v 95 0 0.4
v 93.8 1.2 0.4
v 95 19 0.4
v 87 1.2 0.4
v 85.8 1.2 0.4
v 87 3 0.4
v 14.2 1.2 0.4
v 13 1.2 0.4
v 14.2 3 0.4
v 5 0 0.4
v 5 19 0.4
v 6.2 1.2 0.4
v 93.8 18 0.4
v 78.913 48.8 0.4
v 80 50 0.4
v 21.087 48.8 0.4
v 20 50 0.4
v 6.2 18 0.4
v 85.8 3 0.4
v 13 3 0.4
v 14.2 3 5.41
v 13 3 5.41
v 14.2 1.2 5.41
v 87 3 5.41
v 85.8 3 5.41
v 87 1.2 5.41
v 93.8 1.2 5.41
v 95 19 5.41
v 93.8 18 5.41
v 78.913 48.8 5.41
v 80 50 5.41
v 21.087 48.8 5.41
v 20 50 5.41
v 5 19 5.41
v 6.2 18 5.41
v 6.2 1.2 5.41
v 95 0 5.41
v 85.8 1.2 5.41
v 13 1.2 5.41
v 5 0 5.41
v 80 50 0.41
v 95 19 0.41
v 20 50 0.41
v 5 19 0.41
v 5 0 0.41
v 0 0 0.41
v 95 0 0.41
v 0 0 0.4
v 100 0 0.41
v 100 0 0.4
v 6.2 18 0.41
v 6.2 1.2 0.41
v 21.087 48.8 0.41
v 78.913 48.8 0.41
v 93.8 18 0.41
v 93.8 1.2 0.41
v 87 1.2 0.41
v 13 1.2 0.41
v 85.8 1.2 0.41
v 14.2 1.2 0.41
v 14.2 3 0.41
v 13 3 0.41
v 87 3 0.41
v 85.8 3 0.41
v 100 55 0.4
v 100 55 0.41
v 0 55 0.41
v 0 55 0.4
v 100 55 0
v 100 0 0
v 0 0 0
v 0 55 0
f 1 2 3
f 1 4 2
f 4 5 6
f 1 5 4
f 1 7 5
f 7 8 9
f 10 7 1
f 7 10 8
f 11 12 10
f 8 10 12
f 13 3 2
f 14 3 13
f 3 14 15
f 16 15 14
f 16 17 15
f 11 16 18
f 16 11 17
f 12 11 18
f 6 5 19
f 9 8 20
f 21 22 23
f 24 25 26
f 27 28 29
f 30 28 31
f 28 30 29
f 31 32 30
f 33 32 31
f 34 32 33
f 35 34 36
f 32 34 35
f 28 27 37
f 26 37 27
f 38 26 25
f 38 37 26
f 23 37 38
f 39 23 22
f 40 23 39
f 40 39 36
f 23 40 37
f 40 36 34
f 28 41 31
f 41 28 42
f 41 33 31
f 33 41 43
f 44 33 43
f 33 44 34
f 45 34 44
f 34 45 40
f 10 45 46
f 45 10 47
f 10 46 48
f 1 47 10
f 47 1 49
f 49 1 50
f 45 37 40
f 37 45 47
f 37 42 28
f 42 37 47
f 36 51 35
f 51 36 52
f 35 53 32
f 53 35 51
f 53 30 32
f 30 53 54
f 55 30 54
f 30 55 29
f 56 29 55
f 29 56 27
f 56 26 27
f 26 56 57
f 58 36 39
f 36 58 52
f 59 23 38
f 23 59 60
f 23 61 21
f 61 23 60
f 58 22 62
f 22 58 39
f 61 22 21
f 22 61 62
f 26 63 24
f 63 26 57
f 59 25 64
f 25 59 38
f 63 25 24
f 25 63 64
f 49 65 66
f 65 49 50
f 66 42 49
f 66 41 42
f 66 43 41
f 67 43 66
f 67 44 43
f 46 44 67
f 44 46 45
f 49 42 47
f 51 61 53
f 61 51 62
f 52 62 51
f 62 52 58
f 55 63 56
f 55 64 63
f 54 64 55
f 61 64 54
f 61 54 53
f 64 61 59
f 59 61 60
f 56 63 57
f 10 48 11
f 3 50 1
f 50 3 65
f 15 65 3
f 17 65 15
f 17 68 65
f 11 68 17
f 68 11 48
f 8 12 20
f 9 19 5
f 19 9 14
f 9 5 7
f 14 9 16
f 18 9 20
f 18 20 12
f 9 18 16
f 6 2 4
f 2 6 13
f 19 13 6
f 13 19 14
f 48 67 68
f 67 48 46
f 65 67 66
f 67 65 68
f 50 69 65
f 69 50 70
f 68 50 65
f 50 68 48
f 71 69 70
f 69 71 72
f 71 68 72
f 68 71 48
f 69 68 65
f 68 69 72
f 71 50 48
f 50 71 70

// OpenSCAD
// file: ../../Base/Boxes.scad
// Fischertechnik Box Foundation
// Pre-designed Boxes

use <Constants.scad>

include <PlacementOptions.scad>

box190Width = 190;
box190Depth = 130;
box130Width = 130;
box130Depth = 95;
boxUsageHeight = 33.9;
boxWallThickness = 2.4;
boxBaseThickness = 1.0;
boxWebWidth = 3.0;

// getBoxWallThickness()
// Gets the wall thickness of a Fischertechnik Box

function getBoxWallThickness() = boxWallThickness;

// Gets the usable height of a fischertechnik box
function getBoxUsageHeight() = boxUsageHeight;

// Gets the thickness of the Fischertechnik box base.
function getBoxBaseThickness() = boxBaseThickness;

// Gets the width of a box web
function getBoxWebWidth() = boxWebWidth;

// Gets the usable inner space of a Box 190 as an x/y-list
function getBox190Space() = [
    box190Width - 2*getBoxWallThickness(), 
    box190Depth - 2*getBoxWallThickness() ];

// Imports the Fischertechnik empty box 130x190 mm and places it at position 0,0
// 190x130 are the outer sizes, the inner space is slightly smaller. Use getBox190Space() to get the inner sizes.
// This module needs the STL file "Fischertechnik Box 130x190.stl" in the library path.
// The box is positioned that the usable inner space is at the 0,0,0 position. The

module Box190() {
    translate([-getBoxWallThickness(),-getBoxWallThickness(),-getBoxBaseThickness()])
        import("Fischertechnik Box 130x190.stl", convexity=3);
}

// Gets the usable inner space of a Box 130 as an x/y-list
function getBox130Space() = [
    box130Width - 2*getBoxWallThickness(), 
    box130Depth - 2*getBoxWallThickness() ];

// Imports the Fischertechnik empty box 95x130 mm and places it at position 0,0
// 190x130 are the outer sizes, the inner space is slightly smaller. Use getBox190Space() to get the inner sizes.
// This module needs the STL file "Fischertechnik Box 95x130.stl" in the library path.
// The box is positioned that the usable inner space is at the 0,0,0 position. The

module Box130() {
    translate([-getBoxWallThickness(),-getBoxWallThickness(),-getBoxBaseThickness()])
        import("Fischertechnik Box 95x130.stl", convexity=3);
}

// Creates a web at the specified box walls
// corner 0 = LowerLeft, 1 = UpperLeft, 2 = UpperRight, 3 = LowerRight
// side 0 = LeftOfCorner, 1 = RightOfCorner
// distance = Distance in mm from the corner
// box = inner width and depth of the box (default: Box 190)
// webWidth = length of the web (default is 3 mms)
// webThickness = thickness of the web (default is 1 mm)

module BoxWeb(corner, side, distance, box=getBox190Space(), webWidth=getBoxWebWidth(), webThickness=1.0) {
    sink = getBoxWallThickness()/2;

    width = (corner % 2 == 0) ? 
            (side == LeftOfCorner ? webWidth : webThickness) :
            (side == LeftOfCorner ? webThickness : webWidth);

    depth = (corner % 2 == 0) ? 
            (side == RightOfCorner ? webWidth : webThickness) :
            (side == RightOfCorner ? webThickness : webWidth);
    
    xDiff = corner == LowerLeft ? 
                (side == LeftOfCorner ? -sink : distance) :
            (corner == UpperLeft ?                
                (side == LeftOfCorner ? distance : -sink) :
            (corner == UpperRight ?
                (side == LeftOfCorner ? box.x-webWidth+sink : box.x-distance-webThickness) :
                (side == LeftOfCorner ? box.x-distance-webThickness: box.x-webWidth+sink)));

    yDiff = corner == LowerLeft ? 
                (side == RightOfCorner ? -sink : distance) :
            (corner == UpperLeft ?
                (side == RightOfCorner ? box.y-distance : box.y-webWidth+sink) :
            (corner == UpperRight ?
                (side == RightOfCorner ? box.y-webWidth+sink : box.y-distance) :
                (side == RightOfCorner ? distance : -sink)));
    
    translate([xDiff, yDiff, -getExcess()])
        cube([width, depth, boxUsageHeight + 2*getExcess()]);
}
// file: ../../Base/Rotation.scad
// Fischertechnik Box Foundation
// Geometry Helpers Rotation

include <PlacementOptions.scad>

// getRotatedSpace(space, rotation=NoRotation)
// Rotates the space dependent on the specified rotation

function getRotatedSpace(space, rotation=NoRotation) = [
    (rotation == Rotate90 || rotation == Rotate270) ? space.y : space.x,
    (rotation == Rotate90 || rotation == Rotate270) ? space.x : space.y
];

// Rotates the given space around the fixed left lower corner
// space = the space the children needs as width/depth list [width,depth]
// rotation = 0 Rotate0 degrees, 1 Rotate90 degrees, 2 Rotate180 degrees, 3 Rotate270 degrees (equivalent to -90)

module RotateFix(space, rotation=Rotate0) {
    dy = (rotation == Rotate0 || rotation == Rotate270) ? 0 :
        (rotation == Rotate90) ? space.x :
        space.y;
    dx = (rotation < Rotate180) ? 0 :
        (rotation == Rotate180) ? space.x :
        space.y;
    
    translate([dx, dy, 0])
        rotate([0, 0, rotations[rotation]])
            children();
}
// file: ../../Base/Alignment.scad
// Fischertechnik Box Foundation
// Geometry Helpers Alignment

include <PlacementOptions.scad>

// getAlignedX(elementWidth, spaceWidth, align=AlignRight, offset=0)
// Gets the aligned X offset of an element with the given
// width in the given space.
// elementWidth = The width of the element to positon
// spaceWidth = The space where the element should be aligned
// align = 0 AlignLeft, 1 AlignCenter, 2 AlignRight
// offset = an optional offset from the aligned position. When
// aligned left or centered, then positive values are in X direction.
// When aligned right then positive values are in negative X direction.

function getAlignedX(elementWidth, spaceWidth, align=AlignRight, offset=0) =
    (align == AlignLeft) ?
        offset :
        ((align == AlignCenter) ?
        (spaceWidth - elementWidth)/2 + offset :
        spaceWidth - offset - elementWidth);

// getAlignedY(elementDepth, spaceDepth, align=AlignTop, offset=0)
// Gets the aligned Y offset of an element with the given
// depth in the given space.
// elementDepth = The depth of the element to positon
// spaceDepth = The space where the element should be aligned
// align = 0 AlignBottom, 1 AlignCenter, 2 AlignTop
// offset = an optional offset from the aligned position. When
// aligned bottom or centered, then positive values are in Y direction.
// When aligned top then positive values are in negative Y direction.

function getAlignedY(elementDepth, spaceDepth, align=AlignTop, offset=0) =
    (align == AlignBottom) ?
        offset :
        ((align == AlignCenter) ?
        (spaceDepth - elementDepth)/2 + offset :
        spaceDepth - offset - elementDepth);
// file: ../../Base/PlacementOptions.scad
// Fischertechnik Box Foundation
// Placement Options

// Alignment
NoAlign = 0;
AlignLeft = 1;
AlignBottom = 2;
AlignCenter = 3;
AlignRight = 4;
AlignTop = 5;

// Element rotation degree steps
rotations = [0, -90, -180, -270];

// Rotation
NoRotation = 0;
Rotate0 = 0;
Rotate90 = 1;
Rotate180 = 2;
Rotate270 = 3;

// Docking (seen from above)
NoDock = -1;
DockLeft = 0;
DockTop = 1;
DockRight = 2;
DockCorner = 2;
DockBottom = 3;

// Web corners
LowerLeft = 0;
UpperLeft = 1;
UpperRight = 2;
LowerRight = 3;

// Web position relative to corner
LeftOfCorner = 0;
RightOfCorner = 1;
// file: ../../Base/Placement.scad
// Fischertechnik Box Foundation
// Geometry Helpers Placement

use <Constants.scad>
use <Alignment.scad>
use <Rotation.scad>
use <Boxes.scad>

include <PlacementOptions.scad>

// Place(x=0, y=0, elementSpace=[0,0], alignX=AlignLeft, alignY=AlignBottom, rotation=Rotate0, boxSpace=getBox190Space())
// Places the child at the specified position
// y = Y-Position. This is a relative position when an X aligment is specified.
// x = X-Position. This is a relative position when an Y aligment is specified.
// elementSpace = space of the element to be placed [x,y]
// alignX = -1=NoAlign, 0 AlignLeft, 1 AlignCenter, 3 AlignRight (elementSpace and boxSpace required!)
// alignY = -1=NoAlign, 2 AlignBottom, 1 AlignCenter, 4 AlignTop (elementSpace and boxSpace required!)
// rotation = 0 Rotate0 0 degrees, 1 Rotate90 90 degrees, 
// 2 Rotate180 180 degrees, 3 Rotate270 270 degrees (equivalent to -90)
// boxSpace = Inner space of the box where the placement occurs [x,y] - default is Box 190x130 inner space

module Place(x=0, y=0, elementSpace=[0,0], 
  alignX=AlignLeft, alignY=AlignBottom, 
  rotation=NoRotation, boxSpace=getBox190Space()) {

    module Position(x, y, space, rotation=Rotate0) {
        translate([x, y, 0])
            RotateFix(space, rotation)
                children();
    }

    space = getRotatedSpace(elementSpace, rotation);
    alignedX = getAlignedX(space.x, boxSpace.x, alignX, x);
    alignedY = getAlignedY(space.y, boxSpace.y, alignY, y);
    Position(alignedX, alignedY, elementSpace, rotation)
        children();
}

// Center(space=getBox130Space(), elementSpace=[0,0])
// space = Space where the children is centered. For cylinder use centered=true and no elementSpace.
// elementSpace = space of the element to be centered [x,y]

module Center(space=getBox190Space(), elementSpace=[0,0]) {
    translate([(space.x - elementSpace.x) / 2, (space.y - elementSpace.y) / 2])
        children(0);
}

// CenterHorizontal(width=0, y=0, offset=0, space=getBox130Space())
// space = Space where the children is centered. For cylinder use centered=true and no elementSpace.
// elementSpace = space of the element to be centered [x,y]

module CenterHorizontal(width=0, y=0, offset=0, space=getBox190Space()) {
    translate([(space.x - width) / 2 + offset, y])
        children(0);
}

// CenterVertical(depth=0, x=0, offset=0, space=getBox130Space())
// space = Space where the children is centered. For cylinder use centered=true and no elementSpace.
// elementSpace = space of the element to be centered [x,y]

module CenterVertical(depth=0, x=0, offset=0, space=getBox190Space()) {
    translate([x, (space.y - depth) / 2 + offset])
        children(0);
}
// file: ../../Elements/AxisClip10.scad
// Fischertechnik Box Library
// Axis for clip 10
// 31023

use <../ModelBase/Simple.scad>

width = 12;
depth = 12;
height = 23;

// getAxisClip10Space()
// Gets the space of a frame for a clip 10 with spring ring (mot2)

function getAxisClip10Space() = [width, depth, height];

// AxisClip10()
// Axis for clip 10 with spring ring (mot2)

module AxisClip10() {
    LeveledAxisWithSpace(height, height-10, getAxisClip10Space());
}

// Tests
color("lightgray")
AxisClip10();
// file: ../../Base/Constants.scad
// Fischertechnik Box Foundation
// Constants

// Constant values necessary for multiple elements

// Base constants
dividerThickness = 1.2;
excess = 0.01;
fragments = 90;
tolerance = 0.8;

// Gets the thickness of a divider 
function getDividerThickness() = dividerThickness;

// Gets the excess that is used to merge walls into each other
function getExcess() = excess;

// Gets amount of fragments of a cylinder
function getFragments() = fragments;

// Gets the inner tolerance of a frame to each side
function getTolerance() = tolerance;


// Fischertechnik specific constants
axisDiameter = 4;
axisBottomDiameter = axisDiameter + 1;
standardEdgeDistance = 2.5;
standardWebDistance = 11.5;
standardCornerLength = 15;
tubeWallFactor = 0.8;

// Gets axis diameter
function getAxisDiameter() = axisDiameter;

// Gets axis bottom diameter for thicker part at the bottom
function getAxisBottomDiameter() = axisBottomDiameter;

// gets the standard distance to the wall of the box for dockable frames with webs
function getStandardEdgeDistance() = standardEdgeDistance;

// gets the standard distance of each web to the corner of the dockable frame
function getStandardWebDistance() = standardWebDistance;

// gets the standard length of the corner walls of a dockable frame
function getStandardCornerLength() = standardCornerLength;

// gets the wall thickness of a tube.
function getTubeWallThickness() = tubeWallFactor * getDividerThickness();
// file: ../../Elements/FrameDriversCabLeftRight.scad
// Fischertechnik Box Library
// Frame for Driver's Cab Left and Right Side
// 38435, 38436

use <../Base/Constants.scad>
use <../ModelBase/Simple.scad>

spaceWidth = 100;
spaceDepth = 55;

// getFrameDriversCabLeftRightSpace()
// Gets the space the frame driver's cab left an right side needs as width (.x and .y as a list)

function getFrameDriversCabLeftRightSpace() = [spaceWidth, spaceDepth];

// FrameDriversCabLeftRight()
// Frame for Driver's Cab Left and Right Side
// 38435, 38436

module FrameDriversCabLeftRight() {
    Space ([spaceWidth, spaceDepth]);
    
    widthBottom = 90;
    widthTop = 60;
    depthBottom = 18;
    depthTop = 32;
    depthWeb = 3;
    height = 5;
    totalHeight = height + getExcess();
    
    xTopLeft = (widthBottom - widthTop) / 2;
    xTopRight = xTopLeft + widthTop;
    yTop = depthBottom + depthTop;
    xBottomRight = widthBottom;
    xBottomOffset = (spaceWidth - widthBottom) / 2;
    t = getDividerThickness();
    tX = (depthTop/sqrt(depthTop*depthTop + xTopLeft*xTopLeft)) * t;

    points = [ 
        [0, 0], 
        [0, depthBottom + 1 ], 
        [xTopLeft, yTop], 
        [xTopRight, yTop],
        [xBottomRight, depthBottom +1],
        [xBottomRight, 0],
        [t, t], 
        [t, depthBottom], 
        [xTopLeft+tX, yTop-t], 
        [xTopRight-tX, yTop-t],
        [xBottomRight-t, depthBottom],
        [xBottomRight-t, t],
        ];
    paths = [[0,1,2,3,4,5],[6,7,8,9,10,11]];

    webOffset1 = 8;
    webOffset2 = widthBottom - webOffset1 - getDividerThickness();

    translate([xBottomOffset, 0, -getExcess()]) {    
        linear_extrude(height = totalHeight)
            polygon (points, paths);
        translate([webOffset1, 0, 0])
            cube([getDividerThickness(), depthWeb, totalHeight]);
        translate([webOffset2, 0, 0])
            cube([getDividerThickness(), depthWeb, totalHeight]);        
    }
}

// Test
color("lightgray") {
FrameDriversCabLeftRight();
}
// file: ../TestPrint.scad
// 3D Print Test Base

use <../Base/Constants.scad>

use <../Elements/AxisClip10.scad>

module TestPrint(elementSpace) {
    cube([elementSpace.x, elementSpace.y, 0.4]);
    translate([0,0,0.4+getExcess()]) {
        children();
    }
}

TestPrint(getAxisClip10Space())
    AxisClip10();
// main file
// 3D Print Test Base
// FrameDriversCabLeftRight

use <../TestPrint.scad>
use <../../Elements/FrameDriversCabLeftRight.scad>

TestPrint(getFrameDriversCabLeftRightSpace())
    FrameDriversCabLeftRight();
